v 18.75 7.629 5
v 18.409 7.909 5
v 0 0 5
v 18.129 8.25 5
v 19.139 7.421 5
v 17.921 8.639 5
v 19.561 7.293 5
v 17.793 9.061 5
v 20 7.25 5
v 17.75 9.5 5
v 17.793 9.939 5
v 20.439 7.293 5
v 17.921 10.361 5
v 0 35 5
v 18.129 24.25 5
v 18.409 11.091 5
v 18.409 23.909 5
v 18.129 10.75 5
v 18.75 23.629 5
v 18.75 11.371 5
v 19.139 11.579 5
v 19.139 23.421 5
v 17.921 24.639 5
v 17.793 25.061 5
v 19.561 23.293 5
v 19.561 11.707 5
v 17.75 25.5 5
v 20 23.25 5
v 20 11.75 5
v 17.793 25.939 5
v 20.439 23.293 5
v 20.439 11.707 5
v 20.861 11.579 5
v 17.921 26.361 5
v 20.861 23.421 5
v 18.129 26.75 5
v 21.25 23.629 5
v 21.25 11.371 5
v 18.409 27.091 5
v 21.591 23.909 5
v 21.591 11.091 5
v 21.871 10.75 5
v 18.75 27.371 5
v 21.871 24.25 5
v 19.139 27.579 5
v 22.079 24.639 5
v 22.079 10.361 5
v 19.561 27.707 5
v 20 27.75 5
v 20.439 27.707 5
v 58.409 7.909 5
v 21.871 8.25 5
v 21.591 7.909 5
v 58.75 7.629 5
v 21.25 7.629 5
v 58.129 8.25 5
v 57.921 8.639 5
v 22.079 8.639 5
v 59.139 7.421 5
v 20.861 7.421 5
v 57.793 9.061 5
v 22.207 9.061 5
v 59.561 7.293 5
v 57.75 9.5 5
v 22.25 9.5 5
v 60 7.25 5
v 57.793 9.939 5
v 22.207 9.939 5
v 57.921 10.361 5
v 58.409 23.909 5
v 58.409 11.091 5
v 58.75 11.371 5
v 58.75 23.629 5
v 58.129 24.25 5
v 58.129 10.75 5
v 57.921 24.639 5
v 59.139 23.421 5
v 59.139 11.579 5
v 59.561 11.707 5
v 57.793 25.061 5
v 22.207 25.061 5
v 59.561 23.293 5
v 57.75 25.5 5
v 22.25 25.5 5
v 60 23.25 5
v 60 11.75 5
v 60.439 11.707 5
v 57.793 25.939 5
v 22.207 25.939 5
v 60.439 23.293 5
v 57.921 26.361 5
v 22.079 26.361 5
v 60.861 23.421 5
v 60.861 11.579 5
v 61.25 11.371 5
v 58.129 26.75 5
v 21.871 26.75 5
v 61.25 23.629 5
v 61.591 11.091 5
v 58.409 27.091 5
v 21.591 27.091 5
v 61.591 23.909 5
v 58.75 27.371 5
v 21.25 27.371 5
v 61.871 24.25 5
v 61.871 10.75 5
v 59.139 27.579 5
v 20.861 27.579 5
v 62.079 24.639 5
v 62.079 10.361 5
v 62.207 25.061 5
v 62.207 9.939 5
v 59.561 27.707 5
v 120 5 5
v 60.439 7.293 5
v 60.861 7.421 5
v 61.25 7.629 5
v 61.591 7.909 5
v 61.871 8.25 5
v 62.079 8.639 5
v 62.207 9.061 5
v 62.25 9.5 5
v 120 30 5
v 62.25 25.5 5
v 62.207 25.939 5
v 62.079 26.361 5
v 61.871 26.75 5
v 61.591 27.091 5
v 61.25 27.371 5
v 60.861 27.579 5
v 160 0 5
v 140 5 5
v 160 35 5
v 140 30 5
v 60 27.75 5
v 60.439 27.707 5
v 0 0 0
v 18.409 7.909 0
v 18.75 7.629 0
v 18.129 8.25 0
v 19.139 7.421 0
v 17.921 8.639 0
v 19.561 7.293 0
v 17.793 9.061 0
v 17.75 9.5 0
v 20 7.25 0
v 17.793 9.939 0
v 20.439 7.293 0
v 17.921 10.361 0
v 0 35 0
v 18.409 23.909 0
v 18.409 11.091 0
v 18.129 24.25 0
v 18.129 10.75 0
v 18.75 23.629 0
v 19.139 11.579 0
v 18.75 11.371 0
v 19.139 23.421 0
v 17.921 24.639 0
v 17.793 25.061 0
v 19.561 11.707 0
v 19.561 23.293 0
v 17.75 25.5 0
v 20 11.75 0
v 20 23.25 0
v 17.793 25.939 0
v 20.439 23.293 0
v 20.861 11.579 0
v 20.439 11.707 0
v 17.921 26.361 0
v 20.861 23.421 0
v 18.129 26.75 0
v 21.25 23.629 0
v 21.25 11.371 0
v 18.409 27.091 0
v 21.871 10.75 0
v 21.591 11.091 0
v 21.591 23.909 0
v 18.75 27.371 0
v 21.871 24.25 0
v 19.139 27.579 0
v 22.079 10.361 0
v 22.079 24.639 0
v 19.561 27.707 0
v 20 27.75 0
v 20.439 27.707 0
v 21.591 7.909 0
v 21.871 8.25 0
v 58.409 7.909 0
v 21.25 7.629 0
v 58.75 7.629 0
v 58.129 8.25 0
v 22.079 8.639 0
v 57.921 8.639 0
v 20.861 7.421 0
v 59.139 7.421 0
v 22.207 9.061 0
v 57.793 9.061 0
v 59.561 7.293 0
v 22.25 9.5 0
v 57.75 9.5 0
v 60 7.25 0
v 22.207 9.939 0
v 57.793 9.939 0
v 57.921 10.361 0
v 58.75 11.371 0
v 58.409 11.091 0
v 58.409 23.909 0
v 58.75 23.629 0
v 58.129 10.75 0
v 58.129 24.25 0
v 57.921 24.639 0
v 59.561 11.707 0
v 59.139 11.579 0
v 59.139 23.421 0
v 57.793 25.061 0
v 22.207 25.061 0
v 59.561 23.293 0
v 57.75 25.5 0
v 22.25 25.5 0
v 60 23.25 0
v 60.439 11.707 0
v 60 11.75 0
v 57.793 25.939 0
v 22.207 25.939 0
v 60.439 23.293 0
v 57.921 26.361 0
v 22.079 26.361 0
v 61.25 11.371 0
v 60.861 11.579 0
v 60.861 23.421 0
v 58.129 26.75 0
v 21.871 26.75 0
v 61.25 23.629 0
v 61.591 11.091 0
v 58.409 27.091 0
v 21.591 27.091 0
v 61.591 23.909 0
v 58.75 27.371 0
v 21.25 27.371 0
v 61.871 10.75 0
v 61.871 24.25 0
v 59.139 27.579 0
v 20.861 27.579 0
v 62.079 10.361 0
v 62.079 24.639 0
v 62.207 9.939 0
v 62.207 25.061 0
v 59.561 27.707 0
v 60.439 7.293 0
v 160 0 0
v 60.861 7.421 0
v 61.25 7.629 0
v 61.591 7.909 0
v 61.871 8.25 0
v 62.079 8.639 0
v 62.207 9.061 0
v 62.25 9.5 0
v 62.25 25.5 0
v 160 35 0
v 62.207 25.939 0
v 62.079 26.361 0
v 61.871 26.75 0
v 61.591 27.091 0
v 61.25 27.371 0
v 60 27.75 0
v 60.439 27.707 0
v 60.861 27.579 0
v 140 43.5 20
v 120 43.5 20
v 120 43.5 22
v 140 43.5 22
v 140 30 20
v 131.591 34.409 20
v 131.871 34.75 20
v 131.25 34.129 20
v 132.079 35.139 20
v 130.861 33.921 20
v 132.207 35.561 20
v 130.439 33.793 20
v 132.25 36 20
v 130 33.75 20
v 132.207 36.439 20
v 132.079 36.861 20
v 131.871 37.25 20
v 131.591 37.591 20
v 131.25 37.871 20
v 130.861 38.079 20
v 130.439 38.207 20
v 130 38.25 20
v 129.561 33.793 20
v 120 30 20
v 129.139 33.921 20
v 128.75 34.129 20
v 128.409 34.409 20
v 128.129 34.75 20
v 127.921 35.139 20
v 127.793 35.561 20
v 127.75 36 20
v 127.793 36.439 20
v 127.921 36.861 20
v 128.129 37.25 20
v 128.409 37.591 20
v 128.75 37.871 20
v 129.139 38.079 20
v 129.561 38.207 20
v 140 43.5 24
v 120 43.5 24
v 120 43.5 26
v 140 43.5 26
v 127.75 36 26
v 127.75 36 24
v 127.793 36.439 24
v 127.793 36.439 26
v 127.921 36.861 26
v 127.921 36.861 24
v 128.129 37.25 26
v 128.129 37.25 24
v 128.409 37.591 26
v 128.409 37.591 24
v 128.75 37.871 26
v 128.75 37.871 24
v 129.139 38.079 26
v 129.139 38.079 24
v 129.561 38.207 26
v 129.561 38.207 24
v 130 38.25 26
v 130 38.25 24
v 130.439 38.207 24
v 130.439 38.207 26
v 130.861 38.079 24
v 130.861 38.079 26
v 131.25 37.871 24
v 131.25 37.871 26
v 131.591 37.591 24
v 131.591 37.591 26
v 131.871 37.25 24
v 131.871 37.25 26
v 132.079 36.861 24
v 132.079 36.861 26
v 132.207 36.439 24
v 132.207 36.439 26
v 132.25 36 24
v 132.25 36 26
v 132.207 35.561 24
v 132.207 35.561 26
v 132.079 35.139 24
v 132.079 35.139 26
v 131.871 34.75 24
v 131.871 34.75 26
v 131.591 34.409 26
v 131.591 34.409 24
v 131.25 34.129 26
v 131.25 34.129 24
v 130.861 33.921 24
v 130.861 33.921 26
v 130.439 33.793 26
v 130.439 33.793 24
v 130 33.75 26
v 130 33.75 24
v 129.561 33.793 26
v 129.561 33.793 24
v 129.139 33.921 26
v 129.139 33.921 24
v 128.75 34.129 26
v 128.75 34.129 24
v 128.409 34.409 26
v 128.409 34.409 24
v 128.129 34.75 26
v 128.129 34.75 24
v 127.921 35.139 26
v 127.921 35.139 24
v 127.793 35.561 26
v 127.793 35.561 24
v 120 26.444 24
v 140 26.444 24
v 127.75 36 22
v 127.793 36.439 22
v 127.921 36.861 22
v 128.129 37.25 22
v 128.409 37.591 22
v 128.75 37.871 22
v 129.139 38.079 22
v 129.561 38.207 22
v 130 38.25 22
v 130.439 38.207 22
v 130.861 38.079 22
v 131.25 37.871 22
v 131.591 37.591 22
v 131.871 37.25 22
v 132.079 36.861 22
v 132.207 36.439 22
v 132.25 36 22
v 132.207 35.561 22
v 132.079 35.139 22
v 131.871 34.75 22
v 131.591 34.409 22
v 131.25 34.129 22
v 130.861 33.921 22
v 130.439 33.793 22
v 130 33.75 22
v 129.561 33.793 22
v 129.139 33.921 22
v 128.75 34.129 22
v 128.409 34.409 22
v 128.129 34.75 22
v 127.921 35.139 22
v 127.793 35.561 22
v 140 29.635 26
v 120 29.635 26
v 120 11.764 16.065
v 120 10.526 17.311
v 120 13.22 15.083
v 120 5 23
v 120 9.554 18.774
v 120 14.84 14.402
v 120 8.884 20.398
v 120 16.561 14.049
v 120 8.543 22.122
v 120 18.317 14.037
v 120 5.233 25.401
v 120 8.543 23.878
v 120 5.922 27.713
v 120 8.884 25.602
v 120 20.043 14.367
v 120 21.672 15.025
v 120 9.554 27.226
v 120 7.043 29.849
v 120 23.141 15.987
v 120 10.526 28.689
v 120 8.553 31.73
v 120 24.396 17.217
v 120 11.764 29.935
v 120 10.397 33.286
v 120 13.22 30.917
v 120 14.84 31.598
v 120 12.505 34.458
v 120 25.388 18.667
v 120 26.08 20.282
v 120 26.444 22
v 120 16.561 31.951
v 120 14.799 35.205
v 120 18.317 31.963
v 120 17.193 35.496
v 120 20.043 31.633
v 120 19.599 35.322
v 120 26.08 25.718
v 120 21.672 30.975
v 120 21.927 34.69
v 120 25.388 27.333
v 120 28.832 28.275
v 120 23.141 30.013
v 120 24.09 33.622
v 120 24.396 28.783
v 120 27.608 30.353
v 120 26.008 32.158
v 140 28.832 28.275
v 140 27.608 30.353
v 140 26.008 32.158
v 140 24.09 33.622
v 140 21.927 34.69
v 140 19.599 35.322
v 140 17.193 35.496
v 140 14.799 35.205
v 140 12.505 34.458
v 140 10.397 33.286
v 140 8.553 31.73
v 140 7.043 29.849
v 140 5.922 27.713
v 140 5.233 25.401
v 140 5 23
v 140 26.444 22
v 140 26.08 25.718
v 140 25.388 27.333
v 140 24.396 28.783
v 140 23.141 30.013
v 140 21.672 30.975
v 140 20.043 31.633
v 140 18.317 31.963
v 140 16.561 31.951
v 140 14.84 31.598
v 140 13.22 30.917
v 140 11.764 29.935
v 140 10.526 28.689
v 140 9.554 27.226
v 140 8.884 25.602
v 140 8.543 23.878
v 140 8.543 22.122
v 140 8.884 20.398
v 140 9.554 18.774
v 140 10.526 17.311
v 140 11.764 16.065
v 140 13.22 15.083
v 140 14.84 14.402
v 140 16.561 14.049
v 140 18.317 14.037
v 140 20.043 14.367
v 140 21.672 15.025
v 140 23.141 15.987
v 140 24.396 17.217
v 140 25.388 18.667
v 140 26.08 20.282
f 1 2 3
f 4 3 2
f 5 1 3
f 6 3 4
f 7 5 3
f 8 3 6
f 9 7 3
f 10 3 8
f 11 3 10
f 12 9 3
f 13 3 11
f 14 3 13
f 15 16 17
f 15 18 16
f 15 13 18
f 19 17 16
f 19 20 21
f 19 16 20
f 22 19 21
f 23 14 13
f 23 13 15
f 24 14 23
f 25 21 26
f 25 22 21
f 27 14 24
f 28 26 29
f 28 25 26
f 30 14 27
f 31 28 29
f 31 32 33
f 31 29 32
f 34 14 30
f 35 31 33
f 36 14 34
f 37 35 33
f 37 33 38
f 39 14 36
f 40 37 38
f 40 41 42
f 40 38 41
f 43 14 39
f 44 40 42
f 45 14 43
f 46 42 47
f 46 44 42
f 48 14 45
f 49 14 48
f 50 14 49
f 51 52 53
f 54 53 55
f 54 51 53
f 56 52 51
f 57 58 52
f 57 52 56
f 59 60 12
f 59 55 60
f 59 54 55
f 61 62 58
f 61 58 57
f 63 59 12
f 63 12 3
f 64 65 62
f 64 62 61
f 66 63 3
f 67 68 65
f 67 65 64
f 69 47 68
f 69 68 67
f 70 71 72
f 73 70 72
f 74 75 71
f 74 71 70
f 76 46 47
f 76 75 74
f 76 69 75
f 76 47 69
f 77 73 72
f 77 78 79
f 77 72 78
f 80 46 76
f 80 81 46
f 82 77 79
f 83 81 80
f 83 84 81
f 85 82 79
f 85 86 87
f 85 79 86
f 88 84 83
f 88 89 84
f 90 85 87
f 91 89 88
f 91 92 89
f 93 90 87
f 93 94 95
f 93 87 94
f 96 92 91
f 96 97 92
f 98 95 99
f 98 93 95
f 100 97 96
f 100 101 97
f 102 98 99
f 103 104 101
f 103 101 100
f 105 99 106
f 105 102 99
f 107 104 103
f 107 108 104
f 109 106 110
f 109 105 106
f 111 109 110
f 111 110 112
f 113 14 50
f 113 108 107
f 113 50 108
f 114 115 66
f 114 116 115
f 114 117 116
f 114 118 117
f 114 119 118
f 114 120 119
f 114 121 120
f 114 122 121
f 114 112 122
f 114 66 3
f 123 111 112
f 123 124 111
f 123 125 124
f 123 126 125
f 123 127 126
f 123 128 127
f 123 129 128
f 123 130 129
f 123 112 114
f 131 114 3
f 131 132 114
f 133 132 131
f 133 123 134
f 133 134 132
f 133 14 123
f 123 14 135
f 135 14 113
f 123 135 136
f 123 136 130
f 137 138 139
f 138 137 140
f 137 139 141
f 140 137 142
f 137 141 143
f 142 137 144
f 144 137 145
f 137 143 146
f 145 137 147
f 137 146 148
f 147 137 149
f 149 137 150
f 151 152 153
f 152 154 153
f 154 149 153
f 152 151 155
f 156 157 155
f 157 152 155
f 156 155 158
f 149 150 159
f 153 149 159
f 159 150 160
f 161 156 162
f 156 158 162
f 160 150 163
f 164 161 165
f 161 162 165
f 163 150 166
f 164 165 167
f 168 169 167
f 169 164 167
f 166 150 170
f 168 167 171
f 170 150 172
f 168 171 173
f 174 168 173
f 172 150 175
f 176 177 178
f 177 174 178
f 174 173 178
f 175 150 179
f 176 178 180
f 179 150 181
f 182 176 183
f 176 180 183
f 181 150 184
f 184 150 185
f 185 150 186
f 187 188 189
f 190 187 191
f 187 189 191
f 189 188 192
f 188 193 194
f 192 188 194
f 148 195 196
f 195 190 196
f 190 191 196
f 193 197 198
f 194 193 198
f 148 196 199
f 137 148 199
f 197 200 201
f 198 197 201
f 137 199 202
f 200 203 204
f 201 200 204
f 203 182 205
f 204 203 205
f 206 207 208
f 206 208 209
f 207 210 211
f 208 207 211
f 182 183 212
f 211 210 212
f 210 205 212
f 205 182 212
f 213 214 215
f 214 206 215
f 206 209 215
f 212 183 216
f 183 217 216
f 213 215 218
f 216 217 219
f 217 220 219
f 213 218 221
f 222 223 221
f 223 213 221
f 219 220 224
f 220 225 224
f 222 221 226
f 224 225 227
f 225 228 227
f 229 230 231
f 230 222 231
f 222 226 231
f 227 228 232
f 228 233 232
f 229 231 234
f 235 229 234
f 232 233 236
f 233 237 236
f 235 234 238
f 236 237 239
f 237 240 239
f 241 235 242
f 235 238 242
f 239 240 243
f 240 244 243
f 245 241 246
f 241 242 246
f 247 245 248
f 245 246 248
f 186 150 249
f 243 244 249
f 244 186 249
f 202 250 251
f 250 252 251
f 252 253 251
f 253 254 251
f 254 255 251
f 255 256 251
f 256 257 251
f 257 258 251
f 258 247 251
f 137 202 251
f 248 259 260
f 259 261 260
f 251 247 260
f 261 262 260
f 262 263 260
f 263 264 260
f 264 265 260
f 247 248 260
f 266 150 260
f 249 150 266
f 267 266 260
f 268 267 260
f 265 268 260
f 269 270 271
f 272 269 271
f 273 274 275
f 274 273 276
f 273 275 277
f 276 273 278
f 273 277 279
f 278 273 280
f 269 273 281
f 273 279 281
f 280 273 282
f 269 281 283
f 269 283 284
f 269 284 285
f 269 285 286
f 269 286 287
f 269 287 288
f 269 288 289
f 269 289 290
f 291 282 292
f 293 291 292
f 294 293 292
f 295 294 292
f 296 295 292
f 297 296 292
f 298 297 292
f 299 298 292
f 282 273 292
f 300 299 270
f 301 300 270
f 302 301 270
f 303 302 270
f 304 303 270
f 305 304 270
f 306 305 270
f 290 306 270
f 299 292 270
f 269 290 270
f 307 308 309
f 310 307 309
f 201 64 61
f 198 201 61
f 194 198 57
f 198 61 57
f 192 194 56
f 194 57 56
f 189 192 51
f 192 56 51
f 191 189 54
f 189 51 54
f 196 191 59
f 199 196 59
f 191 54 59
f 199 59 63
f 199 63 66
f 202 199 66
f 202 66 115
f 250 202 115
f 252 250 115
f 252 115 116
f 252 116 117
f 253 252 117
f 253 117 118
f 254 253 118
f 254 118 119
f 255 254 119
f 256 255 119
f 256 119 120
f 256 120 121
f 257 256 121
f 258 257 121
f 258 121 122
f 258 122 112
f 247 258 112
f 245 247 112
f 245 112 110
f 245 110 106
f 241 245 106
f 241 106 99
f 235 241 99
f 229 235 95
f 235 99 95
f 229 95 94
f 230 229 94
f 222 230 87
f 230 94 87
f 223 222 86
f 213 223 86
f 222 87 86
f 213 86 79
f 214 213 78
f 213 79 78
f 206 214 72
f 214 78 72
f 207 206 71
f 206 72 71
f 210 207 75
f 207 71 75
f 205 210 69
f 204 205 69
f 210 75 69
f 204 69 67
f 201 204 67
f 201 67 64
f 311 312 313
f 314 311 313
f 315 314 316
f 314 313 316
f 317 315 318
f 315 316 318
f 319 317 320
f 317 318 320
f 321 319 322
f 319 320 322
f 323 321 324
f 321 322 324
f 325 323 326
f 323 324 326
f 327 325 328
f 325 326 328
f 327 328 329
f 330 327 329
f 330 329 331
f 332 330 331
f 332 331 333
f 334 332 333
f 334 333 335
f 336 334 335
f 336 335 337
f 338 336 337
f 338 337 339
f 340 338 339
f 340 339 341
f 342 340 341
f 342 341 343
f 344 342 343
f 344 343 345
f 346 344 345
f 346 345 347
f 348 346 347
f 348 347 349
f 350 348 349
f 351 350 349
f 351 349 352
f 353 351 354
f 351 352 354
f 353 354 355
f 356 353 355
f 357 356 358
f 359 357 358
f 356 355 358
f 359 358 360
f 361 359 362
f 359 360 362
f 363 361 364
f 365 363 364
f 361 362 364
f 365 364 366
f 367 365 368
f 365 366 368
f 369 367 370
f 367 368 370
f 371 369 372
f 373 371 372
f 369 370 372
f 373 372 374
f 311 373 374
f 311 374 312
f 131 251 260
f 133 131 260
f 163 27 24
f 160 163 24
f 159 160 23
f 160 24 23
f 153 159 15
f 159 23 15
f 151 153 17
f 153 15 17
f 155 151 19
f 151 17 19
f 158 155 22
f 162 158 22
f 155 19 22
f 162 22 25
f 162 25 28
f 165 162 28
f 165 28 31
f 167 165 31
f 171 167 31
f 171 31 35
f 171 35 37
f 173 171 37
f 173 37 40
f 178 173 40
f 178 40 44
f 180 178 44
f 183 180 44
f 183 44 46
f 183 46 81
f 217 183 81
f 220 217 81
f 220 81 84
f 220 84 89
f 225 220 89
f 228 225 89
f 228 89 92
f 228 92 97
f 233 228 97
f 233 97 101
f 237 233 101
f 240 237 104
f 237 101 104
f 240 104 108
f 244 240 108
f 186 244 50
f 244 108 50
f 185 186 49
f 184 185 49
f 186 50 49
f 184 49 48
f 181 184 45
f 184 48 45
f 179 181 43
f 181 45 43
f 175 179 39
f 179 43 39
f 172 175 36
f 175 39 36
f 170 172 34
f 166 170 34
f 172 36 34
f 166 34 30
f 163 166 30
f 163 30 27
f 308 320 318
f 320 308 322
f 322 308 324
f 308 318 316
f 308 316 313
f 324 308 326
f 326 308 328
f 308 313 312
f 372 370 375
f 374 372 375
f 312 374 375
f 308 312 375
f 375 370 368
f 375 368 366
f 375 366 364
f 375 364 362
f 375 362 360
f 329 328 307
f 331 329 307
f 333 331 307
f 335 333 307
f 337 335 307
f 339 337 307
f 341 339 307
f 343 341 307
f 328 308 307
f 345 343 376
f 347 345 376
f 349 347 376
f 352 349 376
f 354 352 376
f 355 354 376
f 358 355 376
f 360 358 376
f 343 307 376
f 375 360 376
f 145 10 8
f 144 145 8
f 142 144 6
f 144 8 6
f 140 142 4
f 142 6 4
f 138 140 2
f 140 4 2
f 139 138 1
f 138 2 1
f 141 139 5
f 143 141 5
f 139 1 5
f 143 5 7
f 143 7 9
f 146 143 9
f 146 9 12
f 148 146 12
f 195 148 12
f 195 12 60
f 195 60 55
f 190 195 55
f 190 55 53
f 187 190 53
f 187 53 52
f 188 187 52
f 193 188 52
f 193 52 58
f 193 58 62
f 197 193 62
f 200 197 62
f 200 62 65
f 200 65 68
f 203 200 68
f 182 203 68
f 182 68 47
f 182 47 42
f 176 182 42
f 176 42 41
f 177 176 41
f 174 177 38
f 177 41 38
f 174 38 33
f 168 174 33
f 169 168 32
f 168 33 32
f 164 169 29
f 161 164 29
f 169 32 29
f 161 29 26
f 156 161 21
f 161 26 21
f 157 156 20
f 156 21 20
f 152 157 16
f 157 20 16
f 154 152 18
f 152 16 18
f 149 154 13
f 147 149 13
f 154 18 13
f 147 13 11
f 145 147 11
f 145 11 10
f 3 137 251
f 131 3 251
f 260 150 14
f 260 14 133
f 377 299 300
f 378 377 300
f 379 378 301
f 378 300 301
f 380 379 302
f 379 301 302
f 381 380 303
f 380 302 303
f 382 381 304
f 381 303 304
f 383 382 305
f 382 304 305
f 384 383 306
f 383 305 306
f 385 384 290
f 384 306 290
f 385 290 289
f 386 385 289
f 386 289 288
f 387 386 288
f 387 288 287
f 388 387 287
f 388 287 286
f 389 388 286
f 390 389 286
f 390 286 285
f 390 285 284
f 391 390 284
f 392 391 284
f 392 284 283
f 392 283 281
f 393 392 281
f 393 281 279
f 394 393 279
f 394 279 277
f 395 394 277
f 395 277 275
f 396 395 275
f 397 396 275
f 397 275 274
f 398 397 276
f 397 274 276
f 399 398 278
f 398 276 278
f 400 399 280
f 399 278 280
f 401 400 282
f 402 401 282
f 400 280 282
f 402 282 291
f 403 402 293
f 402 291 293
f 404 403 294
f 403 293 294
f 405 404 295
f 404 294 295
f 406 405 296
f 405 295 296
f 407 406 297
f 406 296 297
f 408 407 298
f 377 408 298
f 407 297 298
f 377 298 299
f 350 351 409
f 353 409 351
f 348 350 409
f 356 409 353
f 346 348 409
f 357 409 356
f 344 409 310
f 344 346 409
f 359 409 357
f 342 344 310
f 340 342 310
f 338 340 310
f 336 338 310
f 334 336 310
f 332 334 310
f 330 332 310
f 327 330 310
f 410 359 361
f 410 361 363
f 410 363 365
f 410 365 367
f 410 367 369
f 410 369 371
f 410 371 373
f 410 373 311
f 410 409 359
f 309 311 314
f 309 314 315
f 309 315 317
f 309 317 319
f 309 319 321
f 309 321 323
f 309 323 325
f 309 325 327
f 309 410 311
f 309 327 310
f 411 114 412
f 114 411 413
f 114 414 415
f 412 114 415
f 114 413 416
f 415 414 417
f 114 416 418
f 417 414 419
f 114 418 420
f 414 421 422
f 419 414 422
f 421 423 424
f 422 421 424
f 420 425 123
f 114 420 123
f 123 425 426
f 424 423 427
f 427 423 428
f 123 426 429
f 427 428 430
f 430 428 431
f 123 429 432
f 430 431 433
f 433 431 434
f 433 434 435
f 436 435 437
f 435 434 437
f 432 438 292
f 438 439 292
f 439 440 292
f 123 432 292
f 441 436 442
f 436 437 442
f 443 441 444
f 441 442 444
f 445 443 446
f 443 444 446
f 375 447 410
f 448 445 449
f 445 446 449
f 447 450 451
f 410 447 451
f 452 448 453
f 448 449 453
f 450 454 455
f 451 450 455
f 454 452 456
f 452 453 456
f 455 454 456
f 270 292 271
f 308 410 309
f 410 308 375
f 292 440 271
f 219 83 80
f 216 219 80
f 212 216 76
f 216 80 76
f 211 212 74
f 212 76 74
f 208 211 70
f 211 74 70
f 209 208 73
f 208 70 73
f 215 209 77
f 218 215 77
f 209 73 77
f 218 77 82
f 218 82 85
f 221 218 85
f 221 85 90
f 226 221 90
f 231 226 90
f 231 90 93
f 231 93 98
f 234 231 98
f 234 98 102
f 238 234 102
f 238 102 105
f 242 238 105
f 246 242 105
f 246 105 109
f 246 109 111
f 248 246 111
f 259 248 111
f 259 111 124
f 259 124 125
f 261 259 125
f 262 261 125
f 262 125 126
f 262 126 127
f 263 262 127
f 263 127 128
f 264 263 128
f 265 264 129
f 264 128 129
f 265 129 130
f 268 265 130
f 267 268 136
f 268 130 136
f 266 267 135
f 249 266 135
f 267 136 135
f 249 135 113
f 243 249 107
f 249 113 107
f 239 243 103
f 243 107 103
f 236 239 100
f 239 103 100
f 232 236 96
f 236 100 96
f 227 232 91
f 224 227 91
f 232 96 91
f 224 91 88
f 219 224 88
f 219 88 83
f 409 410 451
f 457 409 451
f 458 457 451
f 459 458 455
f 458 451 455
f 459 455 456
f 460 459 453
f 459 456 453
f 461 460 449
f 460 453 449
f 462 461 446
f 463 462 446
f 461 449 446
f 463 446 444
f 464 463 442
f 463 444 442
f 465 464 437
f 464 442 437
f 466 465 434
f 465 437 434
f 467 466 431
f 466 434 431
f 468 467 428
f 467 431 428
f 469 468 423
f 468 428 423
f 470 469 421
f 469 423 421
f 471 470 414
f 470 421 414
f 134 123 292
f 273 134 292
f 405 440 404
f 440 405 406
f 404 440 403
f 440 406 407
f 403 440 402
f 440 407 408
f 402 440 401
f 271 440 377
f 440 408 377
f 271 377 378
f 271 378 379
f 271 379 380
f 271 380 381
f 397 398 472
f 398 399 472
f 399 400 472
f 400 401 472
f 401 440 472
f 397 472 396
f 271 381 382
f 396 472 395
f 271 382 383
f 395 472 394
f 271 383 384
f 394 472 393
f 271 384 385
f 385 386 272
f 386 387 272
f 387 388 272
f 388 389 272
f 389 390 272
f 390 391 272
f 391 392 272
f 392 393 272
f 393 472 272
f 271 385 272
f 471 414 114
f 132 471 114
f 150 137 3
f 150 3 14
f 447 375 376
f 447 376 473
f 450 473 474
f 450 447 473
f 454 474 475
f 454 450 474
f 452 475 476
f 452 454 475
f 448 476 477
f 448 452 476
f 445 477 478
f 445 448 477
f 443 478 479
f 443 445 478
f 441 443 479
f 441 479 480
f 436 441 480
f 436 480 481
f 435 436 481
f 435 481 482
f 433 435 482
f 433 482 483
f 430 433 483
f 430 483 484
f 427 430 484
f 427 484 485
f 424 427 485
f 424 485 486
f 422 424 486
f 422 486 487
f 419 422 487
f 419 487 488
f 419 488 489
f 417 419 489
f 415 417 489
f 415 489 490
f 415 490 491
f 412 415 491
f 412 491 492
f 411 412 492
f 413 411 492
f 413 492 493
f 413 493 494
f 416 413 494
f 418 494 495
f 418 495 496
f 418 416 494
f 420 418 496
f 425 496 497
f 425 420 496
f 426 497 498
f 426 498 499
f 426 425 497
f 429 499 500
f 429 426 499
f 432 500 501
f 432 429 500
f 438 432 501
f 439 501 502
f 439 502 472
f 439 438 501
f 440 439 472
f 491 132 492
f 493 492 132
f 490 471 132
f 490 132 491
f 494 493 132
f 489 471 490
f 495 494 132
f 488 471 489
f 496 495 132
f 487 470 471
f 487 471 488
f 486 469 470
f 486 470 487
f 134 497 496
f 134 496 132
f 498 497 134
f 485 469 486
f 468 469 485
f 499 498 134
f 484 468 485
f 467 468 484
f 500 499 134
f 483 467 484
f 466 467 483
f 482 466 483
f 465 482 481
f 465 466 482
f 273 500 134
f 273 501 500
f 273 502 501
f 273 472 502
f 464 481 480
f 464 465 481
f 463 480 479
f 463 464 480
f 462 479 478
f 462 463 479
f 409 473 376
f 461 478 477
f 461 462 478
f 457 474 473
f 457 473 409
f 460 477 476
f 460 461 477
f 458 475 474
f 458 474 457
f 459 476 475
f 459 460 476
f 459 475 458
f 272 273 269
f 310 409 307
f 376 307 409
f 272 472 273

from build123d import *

# Parameters (mm, degrees)
F0_W      = 160
F0_H      = 35
F1_DEPTH  = 5
F3_D      = 4.5
F5_R      = 9
F6_DEPTH  = 20
F8_DEPTH  = 25
F9_W      = 15
F9_H      = 2
F10_DEPTH = 20
F12_D     = 4.5
F12_DEPTH = 12
F12_TIP   = 1.3519363928


with BuildPart() as f1:
    # F0 (on Top) → F1 (new body)
    with BuildSketch(Plane.XY):
        with Locations((80, 17.5)):
            Rectangle(F0_W, F0_H)
    extrude(amount=F1_DEPTH)

    # F3 (through all)
    with Locations(Plane(origin=(0, 0, 0), x_dir=(1, 0, 0), z_dir=(0, 0, -1))):
        with Locations((20, -9.5), (60, -9.5), (60, -25.5), (20, -25.5)):
            Hole(F3_D / 2)

    # F5 (on offset) → F6 (join)
    with BuildSketch(Plane.YZ.offset(120)):
        with BuildLine():
            Line((5, 23), (5, 5))
            Line((5, 5), (30, 5))
            Line((30, 5), (30, 23))
            ThreePointArc((30, 23), (17.5, 35.5), (5, 23))
        make_face()
        with Locations((17.5, 23)):
            Circle(F5_R, mode=Mode.SUBTRACT)
    extrude(amount=F6_DEPTH)

    # F7 (on face) → F8 (cut)
    with BuildSketch(Plane.YZ.offset(140)):
        with BuildLine():
            Line((29.9599357944, 24), (26.44427191, 24))
            ThreePointArc((26.44427191, 24), (26.4860571774, 23.5007758031), (26.5, 23))
            ThreePointArc((26.5, 23), (26.4860571774, 22.4992241969), (26.44427191, 22))
            Line((26.44427191, 22), (30, 22))
            Line((30, 22), (30, 23))
            ThreePointArc((30, 23), (29.9899799325, 23.5004011242), (29.9599357944, 24))
        make_face()
    extrude(amount=-F8_DEPTH, mode=Mode.SUBTRACT)

    # F9 (on offset) → F10 (join)
    with BuildSketch(Plane.YZ.offset(120)):
        with Locations((36, 21)):
            Rectangle(F9_W, F9_H)
        with Locations((36, 25)):
            Rectangle(F9_W, F9_H)
    extrude(amount=F10_DEPTH)

    # F12
    with Locations(Plane.XY.offset(26)):
        with Locations((130, 36)):
            Hole(F12_D / 2, depth=F12_DEPTH)
            with Locations((0, 0, -(F12_DEPTH + F12_TIP / 2))):  # 118° drill point
                Cone(0, F12_D / 2, F12_TIP, mode=Mode.SUBTRACT)


solid = f1.part
